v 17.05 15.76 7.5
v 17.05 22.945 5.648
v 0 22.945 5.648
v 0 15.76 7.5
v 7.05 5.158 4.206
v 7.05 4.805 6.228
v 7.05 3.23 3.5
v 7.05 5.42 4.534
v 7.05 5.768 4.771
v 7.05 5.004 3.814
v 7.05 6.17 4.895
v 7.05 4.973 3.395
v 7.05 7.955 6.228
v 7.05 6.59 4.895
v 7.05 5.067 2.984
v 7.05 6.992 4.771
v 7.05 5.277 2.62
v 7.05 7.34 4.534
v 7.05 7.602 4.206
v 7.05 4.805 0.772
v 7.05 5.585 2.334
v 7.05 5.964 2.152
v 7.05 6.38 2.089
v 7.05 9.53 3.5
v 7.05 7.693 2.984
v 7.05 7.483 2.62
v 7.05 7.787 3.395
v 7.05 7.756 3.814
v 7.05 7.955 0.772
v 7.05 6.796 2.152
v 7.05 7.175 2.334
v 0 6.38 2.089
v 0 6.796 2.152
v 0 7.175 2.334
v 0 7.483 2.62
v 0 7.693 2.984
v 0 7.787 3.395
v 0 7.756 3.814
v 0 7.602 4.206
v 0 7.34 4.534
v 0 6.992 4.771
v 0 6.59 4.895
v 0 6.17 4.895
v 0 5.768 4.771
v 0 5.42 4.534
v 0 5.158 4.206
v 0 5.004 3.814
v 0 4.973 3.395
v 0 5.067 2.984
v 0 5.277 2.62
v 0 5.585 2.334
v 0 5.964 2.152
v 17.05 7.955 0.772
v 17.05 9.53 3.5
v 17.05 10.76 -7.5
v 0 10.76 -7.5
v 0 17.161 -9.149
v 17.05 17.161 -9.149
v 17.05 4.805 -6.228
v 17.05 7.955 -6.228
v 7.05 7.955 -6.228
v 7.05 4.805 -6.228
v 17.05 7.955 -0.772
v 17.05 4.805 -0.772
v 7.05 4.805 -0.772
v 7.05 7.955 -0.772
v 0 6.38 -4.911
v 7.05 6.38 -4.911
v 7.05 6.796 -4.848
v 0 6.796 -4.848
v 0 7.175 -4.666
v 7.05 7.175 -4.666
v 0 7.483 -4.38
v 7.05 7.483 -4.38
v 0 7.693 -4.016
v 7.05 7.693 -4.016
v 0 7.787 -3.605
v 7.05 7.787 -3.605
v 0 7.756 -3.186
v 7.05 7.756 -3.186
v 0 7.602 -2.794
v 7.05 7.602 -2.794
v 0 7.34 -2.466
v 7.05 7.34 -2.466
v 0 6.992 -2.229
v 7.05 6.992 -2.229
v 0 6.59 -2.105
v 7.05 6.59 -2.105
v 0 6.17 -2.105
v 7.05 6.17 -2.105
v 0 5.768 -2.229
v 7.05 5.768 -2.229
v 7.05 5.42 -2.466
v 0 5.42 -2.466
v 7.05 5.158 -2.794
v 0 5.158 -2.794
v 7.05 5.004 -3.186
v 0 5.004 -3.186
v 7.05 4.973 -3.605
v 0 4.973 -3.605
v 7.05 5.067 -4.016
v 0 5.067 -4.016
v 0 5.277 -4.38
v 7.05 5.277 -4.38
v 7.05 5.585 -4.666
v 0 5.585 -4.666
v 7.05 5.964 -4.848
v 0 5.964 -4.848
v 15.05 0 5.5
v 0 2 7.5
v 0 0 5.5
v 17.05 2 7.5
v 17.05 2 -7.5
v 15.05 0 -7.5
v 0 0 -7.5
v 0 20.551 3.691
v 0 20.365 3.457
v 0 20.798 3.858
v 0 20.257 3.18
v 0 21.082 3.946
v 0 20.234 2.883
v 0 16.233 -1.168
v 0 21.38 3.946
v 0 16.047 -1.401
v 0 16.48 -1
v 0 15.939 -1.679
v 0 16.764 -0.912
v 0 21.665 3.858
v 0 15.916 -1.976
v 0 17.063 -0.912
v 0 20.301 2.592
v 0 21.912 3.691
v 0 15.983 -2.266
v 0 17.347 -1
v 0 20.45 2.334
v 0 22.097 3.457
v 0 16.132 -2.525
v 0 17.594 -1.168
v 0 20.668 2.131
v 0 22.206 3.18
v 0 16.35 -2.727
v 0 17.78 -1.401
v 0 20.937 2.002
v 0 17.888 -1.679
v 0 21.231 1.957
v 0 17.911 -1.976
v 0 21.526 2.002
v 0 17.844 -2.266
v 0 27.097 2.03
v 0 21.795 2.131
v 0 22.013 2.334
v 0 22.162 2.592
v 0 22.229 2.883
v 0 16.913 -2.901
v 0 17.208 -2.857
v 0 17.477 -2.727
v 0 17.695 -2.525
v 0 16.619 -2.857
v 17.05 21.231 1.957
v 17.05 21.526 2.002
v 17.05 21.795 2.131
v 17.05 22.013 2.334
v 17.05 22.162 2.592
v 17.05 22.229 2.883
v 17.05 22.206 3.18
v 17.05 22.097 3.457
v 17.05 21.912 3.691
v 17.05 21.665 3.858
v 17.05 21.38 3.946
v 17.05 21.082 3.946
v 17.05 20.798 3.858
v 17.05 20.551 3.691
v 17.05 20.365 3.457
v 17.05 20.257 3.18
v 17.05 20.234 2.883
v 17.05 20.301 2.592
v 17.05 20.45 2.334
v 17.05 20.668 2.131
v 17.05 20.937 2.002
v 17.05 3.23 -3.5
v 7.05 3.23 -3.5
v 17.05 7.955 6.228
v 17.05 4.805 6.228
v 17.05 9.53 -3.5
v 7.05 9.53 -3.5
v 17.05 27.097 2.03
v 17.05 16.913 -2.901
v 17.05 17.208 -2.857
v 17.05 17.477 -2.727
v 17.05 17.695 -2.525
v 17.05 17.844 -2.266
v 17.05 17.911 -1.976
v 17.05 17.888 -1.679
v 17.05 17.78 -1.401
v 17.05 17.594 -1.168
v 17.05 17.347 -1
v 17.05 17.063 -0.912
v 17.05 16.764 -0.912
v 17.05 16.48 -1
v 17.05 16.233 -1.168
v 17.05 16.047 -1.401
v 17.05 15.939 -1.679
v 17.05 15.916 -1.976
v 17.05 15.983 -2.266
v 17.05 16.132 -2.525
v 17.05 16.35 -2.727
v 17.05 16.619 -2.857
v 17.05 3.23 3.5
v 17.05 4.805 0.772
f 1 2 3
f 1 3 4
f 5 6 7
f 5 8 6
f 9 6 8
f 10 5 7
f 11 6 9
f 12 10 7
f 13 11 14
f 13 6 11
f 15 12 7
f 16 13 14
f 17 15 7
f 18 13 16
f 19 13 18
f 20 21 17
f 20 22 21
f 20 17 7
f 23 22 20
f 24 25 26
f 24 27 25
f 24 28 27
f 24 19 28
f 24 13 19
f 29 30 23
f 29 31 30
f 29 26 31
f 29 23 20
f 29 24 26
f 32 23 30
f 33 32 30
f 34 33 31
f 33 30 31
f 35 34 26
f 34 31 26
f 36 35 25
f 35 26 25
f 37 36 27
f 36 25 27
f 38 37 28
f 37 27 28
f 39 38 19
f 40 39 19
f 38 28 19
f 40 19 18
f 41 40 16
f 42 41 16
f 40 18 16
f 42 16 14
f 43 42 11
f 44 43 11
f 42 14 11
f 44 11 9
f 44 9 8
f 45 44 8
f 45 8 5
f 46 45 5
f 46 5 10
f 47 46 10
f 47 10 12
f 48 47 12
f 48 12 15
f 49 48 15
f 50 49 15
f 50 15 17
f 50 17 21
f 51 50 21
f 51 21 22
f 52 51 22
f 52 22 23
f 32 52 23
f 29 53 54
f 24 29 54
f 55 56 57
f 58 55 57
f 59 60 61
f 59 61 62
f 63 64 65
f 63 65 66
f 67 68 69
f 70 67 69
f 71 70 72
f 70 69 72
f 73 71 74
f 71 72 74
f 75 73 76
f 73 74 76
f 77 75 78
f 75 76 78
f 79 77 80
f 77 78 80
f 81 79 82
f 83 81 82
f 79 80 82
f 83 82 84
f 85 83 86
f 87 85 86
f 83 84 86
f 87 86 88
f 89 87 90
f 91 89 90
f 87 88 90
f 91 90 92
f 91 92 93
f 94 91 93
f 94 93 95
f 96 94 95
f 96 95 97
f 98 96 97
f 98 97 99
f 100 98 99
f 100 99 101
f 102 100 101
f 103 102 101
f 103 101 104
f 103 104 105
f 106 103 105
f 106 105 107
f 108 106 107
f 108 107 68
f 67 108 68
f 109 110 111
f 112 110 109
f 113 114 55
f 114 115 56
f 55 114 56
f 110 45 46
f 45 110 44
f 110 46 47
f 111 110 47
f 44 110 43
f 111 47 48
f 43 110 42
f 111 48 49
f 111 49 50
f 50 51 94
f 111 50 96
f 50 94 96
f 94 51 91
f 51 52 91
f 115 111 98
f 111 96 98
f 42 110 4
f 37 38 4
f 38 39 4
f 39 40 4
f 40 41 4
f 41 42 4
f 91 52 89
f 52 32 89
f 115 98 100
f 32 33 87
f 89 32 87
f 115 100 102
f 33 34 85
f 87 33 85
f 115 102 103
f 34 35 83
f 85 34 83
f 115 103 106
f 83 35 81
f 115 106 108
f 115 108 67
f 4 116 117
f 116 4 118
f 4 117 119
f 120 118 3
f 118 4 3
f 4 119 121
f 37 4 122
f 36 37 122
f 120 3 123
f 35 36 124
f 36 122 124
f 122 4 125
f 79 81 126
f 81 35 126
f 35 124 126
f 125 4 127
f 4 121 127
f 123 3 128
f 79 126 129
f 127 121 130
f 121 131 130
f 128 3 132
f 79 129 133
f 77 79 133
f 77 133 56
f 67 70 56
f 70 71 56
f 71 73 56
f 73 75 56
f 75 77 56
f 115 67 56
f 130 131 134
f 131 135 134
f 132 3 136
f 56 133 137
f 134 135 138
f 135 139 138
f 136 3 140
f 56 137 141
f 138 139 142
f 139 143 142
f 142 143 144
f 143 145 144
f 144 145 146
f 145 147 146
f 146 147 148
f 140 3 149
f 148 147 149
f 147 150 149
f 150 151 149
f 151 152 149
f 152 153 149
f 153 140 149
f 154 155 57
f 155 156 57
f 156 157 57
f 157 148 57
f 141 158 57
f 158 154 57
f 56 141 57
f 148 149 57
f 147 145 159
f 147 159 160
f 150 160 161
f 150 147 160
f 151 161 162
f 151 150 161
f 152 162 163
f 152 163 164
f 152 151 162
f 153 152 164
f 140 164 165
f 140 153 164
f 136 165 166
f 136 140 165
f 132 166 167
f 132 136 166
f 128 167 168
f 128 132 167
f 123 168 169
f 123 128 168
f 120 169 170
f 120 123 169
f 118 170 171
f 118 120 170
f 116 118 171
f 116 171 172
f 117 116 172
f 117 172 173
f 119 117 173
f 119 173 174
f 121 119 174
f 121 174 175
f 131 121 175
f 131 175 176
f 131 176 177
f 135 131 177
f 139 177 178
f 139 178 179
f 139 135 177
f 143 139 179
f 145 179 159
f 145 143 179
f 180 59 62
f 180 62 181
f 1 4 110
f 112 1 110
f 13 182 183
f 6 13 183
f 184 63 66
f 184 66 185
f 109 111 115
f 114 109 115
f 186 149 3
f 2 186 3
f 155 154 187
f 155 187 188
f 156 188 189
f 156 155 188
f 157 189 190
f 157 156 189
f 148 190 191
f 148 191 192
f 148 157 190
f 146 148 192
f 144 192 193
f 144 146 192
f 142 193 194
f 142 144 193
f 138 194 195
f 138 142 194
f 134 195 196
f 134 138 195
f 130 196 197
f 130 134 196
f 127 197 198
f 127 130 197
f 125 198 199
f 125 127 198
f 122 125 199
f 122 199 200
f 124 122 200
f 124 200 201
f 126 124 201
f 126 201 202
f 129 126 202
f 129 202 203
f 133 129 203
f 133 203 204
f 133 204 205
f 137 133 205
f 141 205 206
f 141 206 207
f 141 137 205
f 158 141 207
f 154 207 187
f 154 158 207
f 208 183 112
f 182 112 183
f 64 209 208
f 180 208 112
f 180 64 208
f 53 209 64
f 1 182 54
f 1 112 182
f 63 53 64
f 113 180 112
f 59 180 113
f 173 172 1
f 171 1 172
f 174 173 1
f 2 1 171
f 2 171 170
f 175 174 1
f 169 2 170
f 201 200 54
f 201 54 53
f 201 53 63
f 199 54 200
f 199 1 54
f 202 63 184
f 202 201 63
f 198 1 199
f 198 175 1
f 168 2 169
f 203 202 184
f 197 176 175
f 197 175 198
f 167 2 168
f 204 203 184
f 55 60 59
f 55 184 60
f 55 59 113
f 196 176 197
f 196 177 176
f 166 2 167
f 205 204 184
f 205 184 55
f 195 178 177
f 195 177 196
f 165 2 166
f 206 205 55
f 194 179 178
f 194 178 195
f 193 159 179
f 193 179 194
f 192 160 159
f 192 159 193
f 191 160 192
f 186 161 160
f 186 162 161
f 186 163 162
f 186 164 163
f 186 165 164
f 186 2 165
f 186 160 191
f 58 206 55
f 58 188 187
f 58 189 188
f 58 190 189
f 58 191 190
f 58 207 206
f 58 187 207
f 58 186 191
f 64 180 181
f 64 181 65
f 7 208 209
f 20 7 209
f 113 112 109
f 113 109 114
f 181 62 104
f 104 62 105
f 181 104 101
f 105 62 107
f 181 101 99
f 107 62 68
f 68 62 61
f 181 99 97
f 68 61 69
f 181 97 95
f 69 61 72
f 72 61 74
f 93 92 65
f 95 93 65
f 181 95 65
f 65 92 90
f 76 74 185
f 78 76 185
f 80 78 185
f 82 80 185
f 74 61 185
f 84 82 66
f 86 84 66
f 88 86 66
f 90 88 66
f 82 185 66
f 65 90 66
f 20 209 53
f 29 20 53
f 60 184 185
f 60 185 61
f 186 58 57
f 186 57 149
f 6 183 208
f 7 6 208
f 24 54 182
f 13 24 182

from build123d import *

# Parameters (mm, degrees)
SKETCH1_R           = 1
BOSS_EXTRUDE1_DEPTH = 17.05
CHAMFER3_SIZE       = 2
SKETCH4_R           = 1.411016709
CUT_EXTRUDE2_DEPTH  = 35.812450989
CUT_EXTRUDE3_DEPTH  = 35.812450989
CUT_EXTRUDE4_DEPTH  = 10


with BuildPart() as part:
    # Sketch1 → Boss-Extrude1 (new body)
    with BuildSketch(Plane(origin=(0, 0, 0), x_dir=(0, 0, -1), z_dir=(1, 0, 0))):
        Polygon((-7.5, 0), (7.5, 0), (7.5, 10.76), (9.149426619, 17.160897736), (-4.103828097, 28.939458123), (-7.5, 15.76), align=None)
        with Locations((-2.957491833, 21.231429279)):
            Circle(SKETCH1_R, mode=Mode.SUBTRACT)
        with Locations((1.901052893, 16.913496539)):
            Circle(SKETCH1_R, mode=Mode.SUBTRACT)
    extrude(amount=BOSS_EXTRUDE1_DEPTH)

    # Chamfer3
    chamfer3_edges = [part.edges().sort_by_distance(p)[0] for p in [
        (8.525, 0, 7.5),
        (17.05, 0, 0),
    ]]
    chamfer(chamfer3_edges, length=CHAMFER3_SIZE)

    # Sketch4 → Cut-Extrude2 (cut, through all)
    with BuildSketch(Plane(origin=(17.05, 0, 0), x_dir=(0, 0, -1), z_dir=(1, 0, 0))):
        with Locations((-3.500000028, 6.380001803)):
            Circle(SKETCH4_R)
        with Locations((3.5, 6.380001848)):
            Circle(SKETCH4_R)
    extrude(amount=-CUT_EXTRUDE2_DEPTH, mode=Mode.SUBTRACT)

    # Sketch5 → Cut-Extrude3 (cut, through all)
    with BuildSketch(Plane(origin=(17.05, 0, 0), x_dir=(0, 0, -1), z_dir=(1, 0, 0))):
        Polygon((-4.103828097, 28.939458123), (-2.03016404, 27.096531397), (-5.648400148, 22.945467464), align=None)
    extrude(amount=-CUT_EXTRUDE3_DEPTH, mode=Mode.SUBTRACT)

    # Sketch6 → Cut-Extrude4 (cut)
    with BuildSketch(Plane(origin=(17.05, 0, 0), x_dir=(0, 0, -1), z_dir=(1, 0, 0))):
        Polygon((-3.500000028, 3.230001803), (-0.772020006, 4.805001803), (-0.772020006, 7.955001803), (-3.500000028, 9.530001803), (-6.22798005, 7.955001803), (-6.22798005, 4.805001803), align=None)
        Polygon((6.22798005, 4.805001803), (3.500000028, 3.230001803), (0.772020006, 4.805001803), (0.772020006, 7.955001803), (3.500000028, 9.530001803), (6.22798005, 7.955001803), align=None)
    extrude(amount=-CUT_EXTRUDE4_DEPTH, mode=Mode.SUBTRACT)


solid = part.part
